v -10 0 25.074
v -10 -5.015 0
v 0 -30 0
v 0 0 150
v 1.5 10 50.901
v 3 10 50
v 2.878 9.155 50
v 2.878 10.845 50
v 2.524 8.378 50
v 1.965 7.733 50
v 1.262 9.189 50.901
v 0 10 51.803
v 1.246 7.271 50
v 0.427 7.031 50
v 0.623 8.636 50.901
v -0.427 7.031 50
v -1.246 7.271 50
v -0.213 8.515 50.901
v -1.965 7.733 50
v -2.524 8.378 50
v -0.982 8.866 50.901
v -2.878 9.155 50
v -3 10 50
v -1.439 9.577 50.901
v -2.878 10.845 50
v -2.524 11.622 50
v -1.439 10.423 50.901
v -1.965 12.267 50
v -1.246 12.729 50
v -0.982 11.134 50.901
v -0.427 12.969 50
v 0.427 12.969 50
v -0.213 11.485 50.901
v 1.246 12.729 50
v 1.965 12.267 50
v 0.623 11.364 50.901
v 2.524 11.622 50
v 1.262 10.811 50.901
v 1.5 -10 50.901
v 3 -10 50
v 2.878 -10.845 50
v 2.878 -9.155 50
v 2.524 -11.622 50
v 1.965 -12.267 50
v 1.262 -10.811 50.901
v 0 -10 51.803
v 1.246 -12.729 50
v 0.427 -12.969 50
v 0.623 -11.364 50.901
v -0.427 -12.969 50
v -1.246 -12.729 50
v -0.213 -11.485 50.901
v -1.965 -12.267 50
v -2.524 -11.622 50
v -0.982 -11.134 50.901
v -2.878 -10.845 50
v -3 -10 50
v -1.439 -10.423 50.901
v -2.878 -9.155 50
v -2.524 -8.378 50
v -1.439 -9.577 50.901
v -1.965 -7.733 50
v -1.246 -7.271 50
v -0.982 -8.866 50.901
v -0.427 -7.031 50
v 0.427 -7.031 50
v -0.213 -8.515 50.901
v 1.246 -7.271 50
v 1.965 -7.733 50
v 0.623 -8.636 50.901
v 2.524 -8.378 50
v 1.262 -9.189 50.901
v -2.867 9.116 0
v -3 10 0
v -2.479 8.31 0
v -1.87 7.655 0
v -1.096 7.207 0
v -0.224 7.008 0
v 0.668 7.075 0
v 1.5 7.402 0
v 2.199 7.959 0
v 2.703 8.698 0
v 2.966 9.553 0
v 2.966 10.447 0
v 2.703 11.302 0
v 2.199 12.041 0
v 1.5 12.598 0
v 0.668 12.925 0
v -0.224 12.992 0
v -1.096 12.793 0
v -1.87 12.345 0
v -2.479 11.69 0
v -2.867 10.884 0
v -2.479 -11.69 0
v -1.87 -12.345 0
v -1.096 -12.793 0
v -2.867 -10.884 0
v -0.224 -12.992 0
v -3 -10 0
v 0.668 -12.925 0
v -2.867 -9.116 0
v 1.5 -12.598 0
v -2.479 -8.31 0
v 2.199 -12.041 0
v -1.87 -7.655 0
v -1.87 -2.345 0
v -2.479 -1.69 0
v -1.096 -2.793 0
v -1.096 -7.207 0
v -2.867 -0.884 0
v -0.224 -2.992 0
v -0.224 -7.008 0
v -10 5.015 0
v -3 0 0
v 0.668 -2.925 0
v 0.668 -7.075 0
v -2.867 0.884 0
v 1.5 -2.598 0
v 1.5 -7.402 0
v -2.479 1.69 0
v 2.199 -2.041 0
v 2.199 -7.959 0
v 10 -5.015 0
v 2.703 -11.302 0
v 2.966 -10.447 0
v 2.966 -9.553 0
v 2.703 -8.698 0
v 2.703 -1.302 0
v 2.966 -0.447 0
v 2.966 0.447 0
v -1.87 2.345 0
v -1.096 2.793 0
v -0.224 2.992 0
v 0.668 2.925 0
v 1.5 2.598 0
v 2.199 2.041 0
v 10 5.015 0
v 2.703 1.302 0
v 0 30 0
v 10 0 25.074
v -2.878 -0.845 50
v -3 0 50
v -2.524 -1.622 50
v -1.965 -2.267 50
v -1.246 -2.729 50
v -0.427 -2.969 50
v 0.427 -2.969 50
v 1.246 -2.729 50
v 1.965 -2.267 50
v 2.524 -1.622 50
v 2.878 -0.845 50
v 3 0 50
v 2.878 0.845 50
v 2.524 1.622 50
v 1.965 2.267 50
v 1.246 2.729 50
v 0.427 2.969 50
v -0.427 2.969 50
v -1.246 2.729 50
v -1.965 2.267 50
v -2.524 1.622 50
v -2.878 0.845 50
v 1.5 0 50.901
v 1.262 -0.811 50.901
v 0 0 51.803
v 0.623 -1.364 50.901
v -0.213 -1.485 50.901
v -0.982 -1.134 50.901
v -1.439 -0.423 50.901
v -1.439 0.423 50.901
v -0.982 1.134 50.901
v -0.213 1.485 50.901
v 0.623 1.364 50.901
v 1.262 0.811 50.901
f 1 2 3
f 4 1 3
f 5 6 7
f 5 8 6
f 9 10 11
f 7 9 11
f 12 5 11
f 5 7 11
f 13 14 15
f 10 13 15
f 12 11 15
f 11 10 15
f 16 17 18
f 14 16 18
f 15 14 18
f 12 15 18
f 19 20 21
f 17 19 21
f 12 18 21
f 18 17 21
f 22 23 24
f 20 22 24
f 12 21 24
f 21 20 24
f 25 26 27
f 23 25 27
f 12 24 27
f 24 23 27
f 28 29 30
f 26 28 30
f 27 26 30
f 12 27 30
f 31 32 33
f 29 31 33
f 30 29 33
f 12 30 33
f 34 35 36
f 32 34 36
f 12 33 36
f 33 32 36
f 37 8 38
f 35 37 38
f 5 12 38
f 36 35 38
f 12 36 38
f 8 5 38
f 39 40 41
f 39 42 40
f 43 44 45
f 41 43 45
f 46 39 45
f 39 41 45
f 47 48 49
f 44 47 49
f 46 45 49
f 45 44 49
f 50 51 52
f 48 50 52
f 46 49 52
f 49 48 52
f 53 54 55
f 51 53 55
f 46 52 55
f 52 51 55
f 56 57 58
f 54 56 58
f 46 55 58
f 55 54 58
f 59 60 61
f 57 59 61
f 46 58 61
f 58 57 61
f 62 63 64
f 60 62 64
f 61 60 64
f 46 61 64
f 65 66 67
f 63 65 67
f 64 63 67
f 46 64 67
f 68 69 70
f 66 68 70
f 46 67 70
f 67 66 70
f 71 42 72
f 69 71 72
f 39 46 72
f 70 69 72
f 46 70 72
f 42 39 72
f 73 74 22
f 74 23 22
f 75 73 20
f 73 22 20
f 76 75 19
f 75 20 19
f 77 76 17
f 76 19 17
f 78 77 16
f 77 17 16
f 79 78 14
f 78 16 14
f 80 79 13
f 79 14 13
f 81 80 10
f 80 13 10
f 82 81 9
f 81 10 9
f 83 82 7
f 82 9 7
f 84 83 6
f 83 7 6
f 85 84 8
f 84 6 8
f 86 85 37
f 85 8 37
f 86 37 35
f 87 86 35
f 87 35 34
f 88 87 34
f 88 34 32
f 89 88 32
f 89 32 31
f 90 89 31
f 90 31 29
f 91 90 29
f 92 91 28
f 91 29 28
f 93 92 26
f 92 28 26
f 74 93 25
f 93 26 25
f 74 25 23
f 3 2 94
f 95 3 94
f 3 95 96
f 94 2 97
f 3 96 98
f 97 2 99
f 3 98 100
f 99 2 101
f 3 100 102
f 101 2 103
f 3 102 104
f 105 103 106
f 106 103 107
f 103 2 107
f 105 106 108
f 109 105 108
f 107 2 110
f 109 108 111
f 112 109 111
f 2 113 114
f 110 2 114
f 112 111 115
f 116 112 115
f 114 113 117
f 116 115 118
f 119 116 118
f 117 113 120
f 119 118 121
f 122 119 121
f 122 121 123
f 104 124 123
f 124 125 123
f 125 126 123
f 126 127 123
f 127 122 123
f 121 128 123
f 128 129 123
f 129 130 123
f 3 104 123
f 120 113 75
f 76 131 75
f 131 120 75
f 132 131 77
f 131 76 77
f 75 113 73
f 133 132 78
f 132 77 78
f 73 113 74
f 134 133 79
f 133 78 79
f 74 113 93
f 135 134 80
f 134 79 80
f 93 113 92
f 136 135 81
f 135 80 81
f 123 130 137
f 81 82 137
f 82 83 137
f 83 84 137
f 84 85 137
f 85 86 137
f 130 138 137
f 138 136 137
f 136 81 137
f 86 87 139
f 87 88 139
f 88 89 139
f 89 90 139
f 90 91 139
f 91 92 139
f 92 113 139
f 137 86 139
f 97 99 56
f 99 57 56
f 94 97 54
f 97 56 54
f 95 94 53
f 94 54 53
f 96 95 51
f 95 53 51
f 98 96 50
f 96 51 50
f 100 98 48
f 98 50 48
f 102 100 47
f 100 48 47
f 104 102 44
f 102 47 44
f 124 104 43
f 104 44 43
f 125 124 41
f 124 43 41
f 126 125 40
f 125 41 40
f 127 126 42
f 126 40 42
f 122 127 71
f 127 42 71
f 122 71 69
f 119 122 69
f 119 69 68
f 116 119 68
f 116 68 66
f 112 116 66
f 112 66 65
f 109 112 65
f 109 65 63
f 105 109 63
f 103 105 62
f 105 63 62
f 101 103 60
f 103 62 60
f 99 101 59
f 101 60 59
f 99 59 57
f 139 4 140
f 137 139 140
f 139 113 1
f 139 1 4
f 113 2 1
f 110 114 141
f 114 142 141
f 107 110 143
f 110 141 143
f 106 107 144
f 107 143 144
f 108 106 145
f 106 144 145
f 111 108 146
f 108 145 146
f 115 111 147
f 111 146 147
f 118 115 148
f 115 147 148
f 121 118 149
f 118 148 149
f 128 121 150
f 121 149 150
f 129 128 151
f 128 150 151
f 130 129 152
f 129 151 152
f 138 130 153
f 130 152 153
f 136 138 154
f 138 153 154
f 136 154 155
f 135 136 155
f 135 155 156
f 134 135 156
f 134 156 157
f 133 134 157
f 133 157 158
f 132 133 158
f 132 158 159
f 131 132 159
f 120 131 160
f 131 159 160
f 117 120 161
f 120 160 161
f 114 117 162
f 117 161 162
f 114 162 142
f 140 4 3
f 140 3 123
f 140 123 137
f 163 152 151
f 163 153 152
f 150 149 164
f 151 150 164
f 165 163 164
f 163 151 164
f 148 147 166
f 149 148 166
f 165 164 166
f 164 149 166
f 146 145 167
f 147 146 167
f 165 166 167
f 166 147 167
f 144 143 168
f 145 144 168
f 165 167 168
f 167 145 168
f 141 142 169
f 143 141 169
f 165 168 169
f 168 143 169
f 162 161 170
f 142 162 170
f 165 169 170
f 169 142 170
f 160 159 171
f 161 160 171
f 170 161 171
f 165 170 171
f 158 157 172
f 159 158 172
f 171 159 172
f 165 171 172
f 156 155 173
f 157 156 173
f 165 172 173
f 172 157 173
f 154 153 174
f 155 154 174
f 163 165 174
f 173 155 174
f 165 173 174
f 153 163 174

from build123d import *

# Parameters (mm, degrees)
F0_W        = 20
F0_H        = 60
F1_DEPTH    = 150
F2_D        = 6
F2_DEPTH    = 50
F2_TIP      = 1.8025818571
F3_SIZE2    = 29.99999
F3_SIZE     = 149.99999
F3_2_SIZE2  = 29.99999
F3_2_SIZE   = 149.99999
F4_T1_DEPTH = 407.0708695577
F4_T3_DEPTH = 407.0708695577


# Not quite as in the source:
# - a fillet or chamfer that OpenCascade refuses, or shapes differently, is made with other operations: its cross-section is extruded or revolved along the edge and cut away or added
# - a fillet or chamfer is up to 0.001 mm smaller than in the source, because OpenCascade refuses the exact size


with BuildPart() as f1:
    # F0 (on Top) → F1 (new body)
    with BuildSketch(Plane.XY):
        Rectangle(F0_W, F0_H)
    extrude(amount=F1_DEPTH)

    # F2
    with Locations(Plane(origin=(0, 0, 0), x_dir=(1, 0, 0), z_dir=(0, 0, -1))):
        with Locations((0, -10), (0, 0), (0, 10)):
            Hole(F2_D / 2, depth=F2_DEPTH)
            with Locations((0, 0, -(F2_DEPTH + F2_TIP / 2))):  # 118° drill point
                Cone(0, F2_D / 2, F2_TIP, mode=Mode.SUBTRACT)

    # F3 (size 150 and 30 in the source; OpenCascade refuses exactly that, so slightly less here)
    f3_edges = [f1.edges().sort_by_distance(p)[0] for p in [
        (0, -30, 150),
    ]]
    f3_side = f1.faces().sort_by_distance((0, -30, 75))[0]
    chamfer(f3_edges, length=F3_SIZE, length2=F3_SIZE2, reference=f3_side)

    # F3#2 (size 150 and 30 in the source; OpenCascade refuses exactly that, so slightly less here)
    f3_2_edges = [f1.edges().sort_by_distance(p)[0] for p in [
        (0, 30, 150),
    ]]
    f3_2_side = f1.faces().sort_by_distance((0, 30, 75))[0]
    chamfer(f3_2_edges, length=F3_2_SIZE, length2=F3_2_SIZE2, reference=f3_2_side)

    # F4: chamfer of 24.5 x 10 on 4 edges, made by hand

    # F4_s2 → F4_t1 (cut)
    with BuildSketch(Plane(origin=(0, -38.5287100353, -192.6436015479), x_dir=(1, 0, 0), z_dir=(0, 0.1961160849, 0.9805806857))):
        Polygon((0, -29.4174225336), (10, -4.9174225336), (10, -29.4174225336), align=None)
        Polygon((-10, -4.9174225336), (0, -29.4174225336), (-10, -29.4174225336), align=None)
    extrude(amount=F4_T1_DEPTH, mode=Mode.SUBTRACT)

    # F4_s4 → F4_t3 (cut)
    with BuildSketch(Plane(origin=(0, 38.5287100353, -192.6436015479), x_dir=(1, 0, 0), z_dir=(0, -0.1961160849, 0.9805806857))):
        Polygon((0, 29.4174225336), (10, 4.9174225336), (10, 29.4174225336), align=None)
        Polygon((-10, 4.9174225336), (0, 29.4174225336), (-10, 29.4174225336), align=None)
    extrude(amount=F4_T3_DEPTH, mode=Mode.SUBTRACT)


solid = f1.part
